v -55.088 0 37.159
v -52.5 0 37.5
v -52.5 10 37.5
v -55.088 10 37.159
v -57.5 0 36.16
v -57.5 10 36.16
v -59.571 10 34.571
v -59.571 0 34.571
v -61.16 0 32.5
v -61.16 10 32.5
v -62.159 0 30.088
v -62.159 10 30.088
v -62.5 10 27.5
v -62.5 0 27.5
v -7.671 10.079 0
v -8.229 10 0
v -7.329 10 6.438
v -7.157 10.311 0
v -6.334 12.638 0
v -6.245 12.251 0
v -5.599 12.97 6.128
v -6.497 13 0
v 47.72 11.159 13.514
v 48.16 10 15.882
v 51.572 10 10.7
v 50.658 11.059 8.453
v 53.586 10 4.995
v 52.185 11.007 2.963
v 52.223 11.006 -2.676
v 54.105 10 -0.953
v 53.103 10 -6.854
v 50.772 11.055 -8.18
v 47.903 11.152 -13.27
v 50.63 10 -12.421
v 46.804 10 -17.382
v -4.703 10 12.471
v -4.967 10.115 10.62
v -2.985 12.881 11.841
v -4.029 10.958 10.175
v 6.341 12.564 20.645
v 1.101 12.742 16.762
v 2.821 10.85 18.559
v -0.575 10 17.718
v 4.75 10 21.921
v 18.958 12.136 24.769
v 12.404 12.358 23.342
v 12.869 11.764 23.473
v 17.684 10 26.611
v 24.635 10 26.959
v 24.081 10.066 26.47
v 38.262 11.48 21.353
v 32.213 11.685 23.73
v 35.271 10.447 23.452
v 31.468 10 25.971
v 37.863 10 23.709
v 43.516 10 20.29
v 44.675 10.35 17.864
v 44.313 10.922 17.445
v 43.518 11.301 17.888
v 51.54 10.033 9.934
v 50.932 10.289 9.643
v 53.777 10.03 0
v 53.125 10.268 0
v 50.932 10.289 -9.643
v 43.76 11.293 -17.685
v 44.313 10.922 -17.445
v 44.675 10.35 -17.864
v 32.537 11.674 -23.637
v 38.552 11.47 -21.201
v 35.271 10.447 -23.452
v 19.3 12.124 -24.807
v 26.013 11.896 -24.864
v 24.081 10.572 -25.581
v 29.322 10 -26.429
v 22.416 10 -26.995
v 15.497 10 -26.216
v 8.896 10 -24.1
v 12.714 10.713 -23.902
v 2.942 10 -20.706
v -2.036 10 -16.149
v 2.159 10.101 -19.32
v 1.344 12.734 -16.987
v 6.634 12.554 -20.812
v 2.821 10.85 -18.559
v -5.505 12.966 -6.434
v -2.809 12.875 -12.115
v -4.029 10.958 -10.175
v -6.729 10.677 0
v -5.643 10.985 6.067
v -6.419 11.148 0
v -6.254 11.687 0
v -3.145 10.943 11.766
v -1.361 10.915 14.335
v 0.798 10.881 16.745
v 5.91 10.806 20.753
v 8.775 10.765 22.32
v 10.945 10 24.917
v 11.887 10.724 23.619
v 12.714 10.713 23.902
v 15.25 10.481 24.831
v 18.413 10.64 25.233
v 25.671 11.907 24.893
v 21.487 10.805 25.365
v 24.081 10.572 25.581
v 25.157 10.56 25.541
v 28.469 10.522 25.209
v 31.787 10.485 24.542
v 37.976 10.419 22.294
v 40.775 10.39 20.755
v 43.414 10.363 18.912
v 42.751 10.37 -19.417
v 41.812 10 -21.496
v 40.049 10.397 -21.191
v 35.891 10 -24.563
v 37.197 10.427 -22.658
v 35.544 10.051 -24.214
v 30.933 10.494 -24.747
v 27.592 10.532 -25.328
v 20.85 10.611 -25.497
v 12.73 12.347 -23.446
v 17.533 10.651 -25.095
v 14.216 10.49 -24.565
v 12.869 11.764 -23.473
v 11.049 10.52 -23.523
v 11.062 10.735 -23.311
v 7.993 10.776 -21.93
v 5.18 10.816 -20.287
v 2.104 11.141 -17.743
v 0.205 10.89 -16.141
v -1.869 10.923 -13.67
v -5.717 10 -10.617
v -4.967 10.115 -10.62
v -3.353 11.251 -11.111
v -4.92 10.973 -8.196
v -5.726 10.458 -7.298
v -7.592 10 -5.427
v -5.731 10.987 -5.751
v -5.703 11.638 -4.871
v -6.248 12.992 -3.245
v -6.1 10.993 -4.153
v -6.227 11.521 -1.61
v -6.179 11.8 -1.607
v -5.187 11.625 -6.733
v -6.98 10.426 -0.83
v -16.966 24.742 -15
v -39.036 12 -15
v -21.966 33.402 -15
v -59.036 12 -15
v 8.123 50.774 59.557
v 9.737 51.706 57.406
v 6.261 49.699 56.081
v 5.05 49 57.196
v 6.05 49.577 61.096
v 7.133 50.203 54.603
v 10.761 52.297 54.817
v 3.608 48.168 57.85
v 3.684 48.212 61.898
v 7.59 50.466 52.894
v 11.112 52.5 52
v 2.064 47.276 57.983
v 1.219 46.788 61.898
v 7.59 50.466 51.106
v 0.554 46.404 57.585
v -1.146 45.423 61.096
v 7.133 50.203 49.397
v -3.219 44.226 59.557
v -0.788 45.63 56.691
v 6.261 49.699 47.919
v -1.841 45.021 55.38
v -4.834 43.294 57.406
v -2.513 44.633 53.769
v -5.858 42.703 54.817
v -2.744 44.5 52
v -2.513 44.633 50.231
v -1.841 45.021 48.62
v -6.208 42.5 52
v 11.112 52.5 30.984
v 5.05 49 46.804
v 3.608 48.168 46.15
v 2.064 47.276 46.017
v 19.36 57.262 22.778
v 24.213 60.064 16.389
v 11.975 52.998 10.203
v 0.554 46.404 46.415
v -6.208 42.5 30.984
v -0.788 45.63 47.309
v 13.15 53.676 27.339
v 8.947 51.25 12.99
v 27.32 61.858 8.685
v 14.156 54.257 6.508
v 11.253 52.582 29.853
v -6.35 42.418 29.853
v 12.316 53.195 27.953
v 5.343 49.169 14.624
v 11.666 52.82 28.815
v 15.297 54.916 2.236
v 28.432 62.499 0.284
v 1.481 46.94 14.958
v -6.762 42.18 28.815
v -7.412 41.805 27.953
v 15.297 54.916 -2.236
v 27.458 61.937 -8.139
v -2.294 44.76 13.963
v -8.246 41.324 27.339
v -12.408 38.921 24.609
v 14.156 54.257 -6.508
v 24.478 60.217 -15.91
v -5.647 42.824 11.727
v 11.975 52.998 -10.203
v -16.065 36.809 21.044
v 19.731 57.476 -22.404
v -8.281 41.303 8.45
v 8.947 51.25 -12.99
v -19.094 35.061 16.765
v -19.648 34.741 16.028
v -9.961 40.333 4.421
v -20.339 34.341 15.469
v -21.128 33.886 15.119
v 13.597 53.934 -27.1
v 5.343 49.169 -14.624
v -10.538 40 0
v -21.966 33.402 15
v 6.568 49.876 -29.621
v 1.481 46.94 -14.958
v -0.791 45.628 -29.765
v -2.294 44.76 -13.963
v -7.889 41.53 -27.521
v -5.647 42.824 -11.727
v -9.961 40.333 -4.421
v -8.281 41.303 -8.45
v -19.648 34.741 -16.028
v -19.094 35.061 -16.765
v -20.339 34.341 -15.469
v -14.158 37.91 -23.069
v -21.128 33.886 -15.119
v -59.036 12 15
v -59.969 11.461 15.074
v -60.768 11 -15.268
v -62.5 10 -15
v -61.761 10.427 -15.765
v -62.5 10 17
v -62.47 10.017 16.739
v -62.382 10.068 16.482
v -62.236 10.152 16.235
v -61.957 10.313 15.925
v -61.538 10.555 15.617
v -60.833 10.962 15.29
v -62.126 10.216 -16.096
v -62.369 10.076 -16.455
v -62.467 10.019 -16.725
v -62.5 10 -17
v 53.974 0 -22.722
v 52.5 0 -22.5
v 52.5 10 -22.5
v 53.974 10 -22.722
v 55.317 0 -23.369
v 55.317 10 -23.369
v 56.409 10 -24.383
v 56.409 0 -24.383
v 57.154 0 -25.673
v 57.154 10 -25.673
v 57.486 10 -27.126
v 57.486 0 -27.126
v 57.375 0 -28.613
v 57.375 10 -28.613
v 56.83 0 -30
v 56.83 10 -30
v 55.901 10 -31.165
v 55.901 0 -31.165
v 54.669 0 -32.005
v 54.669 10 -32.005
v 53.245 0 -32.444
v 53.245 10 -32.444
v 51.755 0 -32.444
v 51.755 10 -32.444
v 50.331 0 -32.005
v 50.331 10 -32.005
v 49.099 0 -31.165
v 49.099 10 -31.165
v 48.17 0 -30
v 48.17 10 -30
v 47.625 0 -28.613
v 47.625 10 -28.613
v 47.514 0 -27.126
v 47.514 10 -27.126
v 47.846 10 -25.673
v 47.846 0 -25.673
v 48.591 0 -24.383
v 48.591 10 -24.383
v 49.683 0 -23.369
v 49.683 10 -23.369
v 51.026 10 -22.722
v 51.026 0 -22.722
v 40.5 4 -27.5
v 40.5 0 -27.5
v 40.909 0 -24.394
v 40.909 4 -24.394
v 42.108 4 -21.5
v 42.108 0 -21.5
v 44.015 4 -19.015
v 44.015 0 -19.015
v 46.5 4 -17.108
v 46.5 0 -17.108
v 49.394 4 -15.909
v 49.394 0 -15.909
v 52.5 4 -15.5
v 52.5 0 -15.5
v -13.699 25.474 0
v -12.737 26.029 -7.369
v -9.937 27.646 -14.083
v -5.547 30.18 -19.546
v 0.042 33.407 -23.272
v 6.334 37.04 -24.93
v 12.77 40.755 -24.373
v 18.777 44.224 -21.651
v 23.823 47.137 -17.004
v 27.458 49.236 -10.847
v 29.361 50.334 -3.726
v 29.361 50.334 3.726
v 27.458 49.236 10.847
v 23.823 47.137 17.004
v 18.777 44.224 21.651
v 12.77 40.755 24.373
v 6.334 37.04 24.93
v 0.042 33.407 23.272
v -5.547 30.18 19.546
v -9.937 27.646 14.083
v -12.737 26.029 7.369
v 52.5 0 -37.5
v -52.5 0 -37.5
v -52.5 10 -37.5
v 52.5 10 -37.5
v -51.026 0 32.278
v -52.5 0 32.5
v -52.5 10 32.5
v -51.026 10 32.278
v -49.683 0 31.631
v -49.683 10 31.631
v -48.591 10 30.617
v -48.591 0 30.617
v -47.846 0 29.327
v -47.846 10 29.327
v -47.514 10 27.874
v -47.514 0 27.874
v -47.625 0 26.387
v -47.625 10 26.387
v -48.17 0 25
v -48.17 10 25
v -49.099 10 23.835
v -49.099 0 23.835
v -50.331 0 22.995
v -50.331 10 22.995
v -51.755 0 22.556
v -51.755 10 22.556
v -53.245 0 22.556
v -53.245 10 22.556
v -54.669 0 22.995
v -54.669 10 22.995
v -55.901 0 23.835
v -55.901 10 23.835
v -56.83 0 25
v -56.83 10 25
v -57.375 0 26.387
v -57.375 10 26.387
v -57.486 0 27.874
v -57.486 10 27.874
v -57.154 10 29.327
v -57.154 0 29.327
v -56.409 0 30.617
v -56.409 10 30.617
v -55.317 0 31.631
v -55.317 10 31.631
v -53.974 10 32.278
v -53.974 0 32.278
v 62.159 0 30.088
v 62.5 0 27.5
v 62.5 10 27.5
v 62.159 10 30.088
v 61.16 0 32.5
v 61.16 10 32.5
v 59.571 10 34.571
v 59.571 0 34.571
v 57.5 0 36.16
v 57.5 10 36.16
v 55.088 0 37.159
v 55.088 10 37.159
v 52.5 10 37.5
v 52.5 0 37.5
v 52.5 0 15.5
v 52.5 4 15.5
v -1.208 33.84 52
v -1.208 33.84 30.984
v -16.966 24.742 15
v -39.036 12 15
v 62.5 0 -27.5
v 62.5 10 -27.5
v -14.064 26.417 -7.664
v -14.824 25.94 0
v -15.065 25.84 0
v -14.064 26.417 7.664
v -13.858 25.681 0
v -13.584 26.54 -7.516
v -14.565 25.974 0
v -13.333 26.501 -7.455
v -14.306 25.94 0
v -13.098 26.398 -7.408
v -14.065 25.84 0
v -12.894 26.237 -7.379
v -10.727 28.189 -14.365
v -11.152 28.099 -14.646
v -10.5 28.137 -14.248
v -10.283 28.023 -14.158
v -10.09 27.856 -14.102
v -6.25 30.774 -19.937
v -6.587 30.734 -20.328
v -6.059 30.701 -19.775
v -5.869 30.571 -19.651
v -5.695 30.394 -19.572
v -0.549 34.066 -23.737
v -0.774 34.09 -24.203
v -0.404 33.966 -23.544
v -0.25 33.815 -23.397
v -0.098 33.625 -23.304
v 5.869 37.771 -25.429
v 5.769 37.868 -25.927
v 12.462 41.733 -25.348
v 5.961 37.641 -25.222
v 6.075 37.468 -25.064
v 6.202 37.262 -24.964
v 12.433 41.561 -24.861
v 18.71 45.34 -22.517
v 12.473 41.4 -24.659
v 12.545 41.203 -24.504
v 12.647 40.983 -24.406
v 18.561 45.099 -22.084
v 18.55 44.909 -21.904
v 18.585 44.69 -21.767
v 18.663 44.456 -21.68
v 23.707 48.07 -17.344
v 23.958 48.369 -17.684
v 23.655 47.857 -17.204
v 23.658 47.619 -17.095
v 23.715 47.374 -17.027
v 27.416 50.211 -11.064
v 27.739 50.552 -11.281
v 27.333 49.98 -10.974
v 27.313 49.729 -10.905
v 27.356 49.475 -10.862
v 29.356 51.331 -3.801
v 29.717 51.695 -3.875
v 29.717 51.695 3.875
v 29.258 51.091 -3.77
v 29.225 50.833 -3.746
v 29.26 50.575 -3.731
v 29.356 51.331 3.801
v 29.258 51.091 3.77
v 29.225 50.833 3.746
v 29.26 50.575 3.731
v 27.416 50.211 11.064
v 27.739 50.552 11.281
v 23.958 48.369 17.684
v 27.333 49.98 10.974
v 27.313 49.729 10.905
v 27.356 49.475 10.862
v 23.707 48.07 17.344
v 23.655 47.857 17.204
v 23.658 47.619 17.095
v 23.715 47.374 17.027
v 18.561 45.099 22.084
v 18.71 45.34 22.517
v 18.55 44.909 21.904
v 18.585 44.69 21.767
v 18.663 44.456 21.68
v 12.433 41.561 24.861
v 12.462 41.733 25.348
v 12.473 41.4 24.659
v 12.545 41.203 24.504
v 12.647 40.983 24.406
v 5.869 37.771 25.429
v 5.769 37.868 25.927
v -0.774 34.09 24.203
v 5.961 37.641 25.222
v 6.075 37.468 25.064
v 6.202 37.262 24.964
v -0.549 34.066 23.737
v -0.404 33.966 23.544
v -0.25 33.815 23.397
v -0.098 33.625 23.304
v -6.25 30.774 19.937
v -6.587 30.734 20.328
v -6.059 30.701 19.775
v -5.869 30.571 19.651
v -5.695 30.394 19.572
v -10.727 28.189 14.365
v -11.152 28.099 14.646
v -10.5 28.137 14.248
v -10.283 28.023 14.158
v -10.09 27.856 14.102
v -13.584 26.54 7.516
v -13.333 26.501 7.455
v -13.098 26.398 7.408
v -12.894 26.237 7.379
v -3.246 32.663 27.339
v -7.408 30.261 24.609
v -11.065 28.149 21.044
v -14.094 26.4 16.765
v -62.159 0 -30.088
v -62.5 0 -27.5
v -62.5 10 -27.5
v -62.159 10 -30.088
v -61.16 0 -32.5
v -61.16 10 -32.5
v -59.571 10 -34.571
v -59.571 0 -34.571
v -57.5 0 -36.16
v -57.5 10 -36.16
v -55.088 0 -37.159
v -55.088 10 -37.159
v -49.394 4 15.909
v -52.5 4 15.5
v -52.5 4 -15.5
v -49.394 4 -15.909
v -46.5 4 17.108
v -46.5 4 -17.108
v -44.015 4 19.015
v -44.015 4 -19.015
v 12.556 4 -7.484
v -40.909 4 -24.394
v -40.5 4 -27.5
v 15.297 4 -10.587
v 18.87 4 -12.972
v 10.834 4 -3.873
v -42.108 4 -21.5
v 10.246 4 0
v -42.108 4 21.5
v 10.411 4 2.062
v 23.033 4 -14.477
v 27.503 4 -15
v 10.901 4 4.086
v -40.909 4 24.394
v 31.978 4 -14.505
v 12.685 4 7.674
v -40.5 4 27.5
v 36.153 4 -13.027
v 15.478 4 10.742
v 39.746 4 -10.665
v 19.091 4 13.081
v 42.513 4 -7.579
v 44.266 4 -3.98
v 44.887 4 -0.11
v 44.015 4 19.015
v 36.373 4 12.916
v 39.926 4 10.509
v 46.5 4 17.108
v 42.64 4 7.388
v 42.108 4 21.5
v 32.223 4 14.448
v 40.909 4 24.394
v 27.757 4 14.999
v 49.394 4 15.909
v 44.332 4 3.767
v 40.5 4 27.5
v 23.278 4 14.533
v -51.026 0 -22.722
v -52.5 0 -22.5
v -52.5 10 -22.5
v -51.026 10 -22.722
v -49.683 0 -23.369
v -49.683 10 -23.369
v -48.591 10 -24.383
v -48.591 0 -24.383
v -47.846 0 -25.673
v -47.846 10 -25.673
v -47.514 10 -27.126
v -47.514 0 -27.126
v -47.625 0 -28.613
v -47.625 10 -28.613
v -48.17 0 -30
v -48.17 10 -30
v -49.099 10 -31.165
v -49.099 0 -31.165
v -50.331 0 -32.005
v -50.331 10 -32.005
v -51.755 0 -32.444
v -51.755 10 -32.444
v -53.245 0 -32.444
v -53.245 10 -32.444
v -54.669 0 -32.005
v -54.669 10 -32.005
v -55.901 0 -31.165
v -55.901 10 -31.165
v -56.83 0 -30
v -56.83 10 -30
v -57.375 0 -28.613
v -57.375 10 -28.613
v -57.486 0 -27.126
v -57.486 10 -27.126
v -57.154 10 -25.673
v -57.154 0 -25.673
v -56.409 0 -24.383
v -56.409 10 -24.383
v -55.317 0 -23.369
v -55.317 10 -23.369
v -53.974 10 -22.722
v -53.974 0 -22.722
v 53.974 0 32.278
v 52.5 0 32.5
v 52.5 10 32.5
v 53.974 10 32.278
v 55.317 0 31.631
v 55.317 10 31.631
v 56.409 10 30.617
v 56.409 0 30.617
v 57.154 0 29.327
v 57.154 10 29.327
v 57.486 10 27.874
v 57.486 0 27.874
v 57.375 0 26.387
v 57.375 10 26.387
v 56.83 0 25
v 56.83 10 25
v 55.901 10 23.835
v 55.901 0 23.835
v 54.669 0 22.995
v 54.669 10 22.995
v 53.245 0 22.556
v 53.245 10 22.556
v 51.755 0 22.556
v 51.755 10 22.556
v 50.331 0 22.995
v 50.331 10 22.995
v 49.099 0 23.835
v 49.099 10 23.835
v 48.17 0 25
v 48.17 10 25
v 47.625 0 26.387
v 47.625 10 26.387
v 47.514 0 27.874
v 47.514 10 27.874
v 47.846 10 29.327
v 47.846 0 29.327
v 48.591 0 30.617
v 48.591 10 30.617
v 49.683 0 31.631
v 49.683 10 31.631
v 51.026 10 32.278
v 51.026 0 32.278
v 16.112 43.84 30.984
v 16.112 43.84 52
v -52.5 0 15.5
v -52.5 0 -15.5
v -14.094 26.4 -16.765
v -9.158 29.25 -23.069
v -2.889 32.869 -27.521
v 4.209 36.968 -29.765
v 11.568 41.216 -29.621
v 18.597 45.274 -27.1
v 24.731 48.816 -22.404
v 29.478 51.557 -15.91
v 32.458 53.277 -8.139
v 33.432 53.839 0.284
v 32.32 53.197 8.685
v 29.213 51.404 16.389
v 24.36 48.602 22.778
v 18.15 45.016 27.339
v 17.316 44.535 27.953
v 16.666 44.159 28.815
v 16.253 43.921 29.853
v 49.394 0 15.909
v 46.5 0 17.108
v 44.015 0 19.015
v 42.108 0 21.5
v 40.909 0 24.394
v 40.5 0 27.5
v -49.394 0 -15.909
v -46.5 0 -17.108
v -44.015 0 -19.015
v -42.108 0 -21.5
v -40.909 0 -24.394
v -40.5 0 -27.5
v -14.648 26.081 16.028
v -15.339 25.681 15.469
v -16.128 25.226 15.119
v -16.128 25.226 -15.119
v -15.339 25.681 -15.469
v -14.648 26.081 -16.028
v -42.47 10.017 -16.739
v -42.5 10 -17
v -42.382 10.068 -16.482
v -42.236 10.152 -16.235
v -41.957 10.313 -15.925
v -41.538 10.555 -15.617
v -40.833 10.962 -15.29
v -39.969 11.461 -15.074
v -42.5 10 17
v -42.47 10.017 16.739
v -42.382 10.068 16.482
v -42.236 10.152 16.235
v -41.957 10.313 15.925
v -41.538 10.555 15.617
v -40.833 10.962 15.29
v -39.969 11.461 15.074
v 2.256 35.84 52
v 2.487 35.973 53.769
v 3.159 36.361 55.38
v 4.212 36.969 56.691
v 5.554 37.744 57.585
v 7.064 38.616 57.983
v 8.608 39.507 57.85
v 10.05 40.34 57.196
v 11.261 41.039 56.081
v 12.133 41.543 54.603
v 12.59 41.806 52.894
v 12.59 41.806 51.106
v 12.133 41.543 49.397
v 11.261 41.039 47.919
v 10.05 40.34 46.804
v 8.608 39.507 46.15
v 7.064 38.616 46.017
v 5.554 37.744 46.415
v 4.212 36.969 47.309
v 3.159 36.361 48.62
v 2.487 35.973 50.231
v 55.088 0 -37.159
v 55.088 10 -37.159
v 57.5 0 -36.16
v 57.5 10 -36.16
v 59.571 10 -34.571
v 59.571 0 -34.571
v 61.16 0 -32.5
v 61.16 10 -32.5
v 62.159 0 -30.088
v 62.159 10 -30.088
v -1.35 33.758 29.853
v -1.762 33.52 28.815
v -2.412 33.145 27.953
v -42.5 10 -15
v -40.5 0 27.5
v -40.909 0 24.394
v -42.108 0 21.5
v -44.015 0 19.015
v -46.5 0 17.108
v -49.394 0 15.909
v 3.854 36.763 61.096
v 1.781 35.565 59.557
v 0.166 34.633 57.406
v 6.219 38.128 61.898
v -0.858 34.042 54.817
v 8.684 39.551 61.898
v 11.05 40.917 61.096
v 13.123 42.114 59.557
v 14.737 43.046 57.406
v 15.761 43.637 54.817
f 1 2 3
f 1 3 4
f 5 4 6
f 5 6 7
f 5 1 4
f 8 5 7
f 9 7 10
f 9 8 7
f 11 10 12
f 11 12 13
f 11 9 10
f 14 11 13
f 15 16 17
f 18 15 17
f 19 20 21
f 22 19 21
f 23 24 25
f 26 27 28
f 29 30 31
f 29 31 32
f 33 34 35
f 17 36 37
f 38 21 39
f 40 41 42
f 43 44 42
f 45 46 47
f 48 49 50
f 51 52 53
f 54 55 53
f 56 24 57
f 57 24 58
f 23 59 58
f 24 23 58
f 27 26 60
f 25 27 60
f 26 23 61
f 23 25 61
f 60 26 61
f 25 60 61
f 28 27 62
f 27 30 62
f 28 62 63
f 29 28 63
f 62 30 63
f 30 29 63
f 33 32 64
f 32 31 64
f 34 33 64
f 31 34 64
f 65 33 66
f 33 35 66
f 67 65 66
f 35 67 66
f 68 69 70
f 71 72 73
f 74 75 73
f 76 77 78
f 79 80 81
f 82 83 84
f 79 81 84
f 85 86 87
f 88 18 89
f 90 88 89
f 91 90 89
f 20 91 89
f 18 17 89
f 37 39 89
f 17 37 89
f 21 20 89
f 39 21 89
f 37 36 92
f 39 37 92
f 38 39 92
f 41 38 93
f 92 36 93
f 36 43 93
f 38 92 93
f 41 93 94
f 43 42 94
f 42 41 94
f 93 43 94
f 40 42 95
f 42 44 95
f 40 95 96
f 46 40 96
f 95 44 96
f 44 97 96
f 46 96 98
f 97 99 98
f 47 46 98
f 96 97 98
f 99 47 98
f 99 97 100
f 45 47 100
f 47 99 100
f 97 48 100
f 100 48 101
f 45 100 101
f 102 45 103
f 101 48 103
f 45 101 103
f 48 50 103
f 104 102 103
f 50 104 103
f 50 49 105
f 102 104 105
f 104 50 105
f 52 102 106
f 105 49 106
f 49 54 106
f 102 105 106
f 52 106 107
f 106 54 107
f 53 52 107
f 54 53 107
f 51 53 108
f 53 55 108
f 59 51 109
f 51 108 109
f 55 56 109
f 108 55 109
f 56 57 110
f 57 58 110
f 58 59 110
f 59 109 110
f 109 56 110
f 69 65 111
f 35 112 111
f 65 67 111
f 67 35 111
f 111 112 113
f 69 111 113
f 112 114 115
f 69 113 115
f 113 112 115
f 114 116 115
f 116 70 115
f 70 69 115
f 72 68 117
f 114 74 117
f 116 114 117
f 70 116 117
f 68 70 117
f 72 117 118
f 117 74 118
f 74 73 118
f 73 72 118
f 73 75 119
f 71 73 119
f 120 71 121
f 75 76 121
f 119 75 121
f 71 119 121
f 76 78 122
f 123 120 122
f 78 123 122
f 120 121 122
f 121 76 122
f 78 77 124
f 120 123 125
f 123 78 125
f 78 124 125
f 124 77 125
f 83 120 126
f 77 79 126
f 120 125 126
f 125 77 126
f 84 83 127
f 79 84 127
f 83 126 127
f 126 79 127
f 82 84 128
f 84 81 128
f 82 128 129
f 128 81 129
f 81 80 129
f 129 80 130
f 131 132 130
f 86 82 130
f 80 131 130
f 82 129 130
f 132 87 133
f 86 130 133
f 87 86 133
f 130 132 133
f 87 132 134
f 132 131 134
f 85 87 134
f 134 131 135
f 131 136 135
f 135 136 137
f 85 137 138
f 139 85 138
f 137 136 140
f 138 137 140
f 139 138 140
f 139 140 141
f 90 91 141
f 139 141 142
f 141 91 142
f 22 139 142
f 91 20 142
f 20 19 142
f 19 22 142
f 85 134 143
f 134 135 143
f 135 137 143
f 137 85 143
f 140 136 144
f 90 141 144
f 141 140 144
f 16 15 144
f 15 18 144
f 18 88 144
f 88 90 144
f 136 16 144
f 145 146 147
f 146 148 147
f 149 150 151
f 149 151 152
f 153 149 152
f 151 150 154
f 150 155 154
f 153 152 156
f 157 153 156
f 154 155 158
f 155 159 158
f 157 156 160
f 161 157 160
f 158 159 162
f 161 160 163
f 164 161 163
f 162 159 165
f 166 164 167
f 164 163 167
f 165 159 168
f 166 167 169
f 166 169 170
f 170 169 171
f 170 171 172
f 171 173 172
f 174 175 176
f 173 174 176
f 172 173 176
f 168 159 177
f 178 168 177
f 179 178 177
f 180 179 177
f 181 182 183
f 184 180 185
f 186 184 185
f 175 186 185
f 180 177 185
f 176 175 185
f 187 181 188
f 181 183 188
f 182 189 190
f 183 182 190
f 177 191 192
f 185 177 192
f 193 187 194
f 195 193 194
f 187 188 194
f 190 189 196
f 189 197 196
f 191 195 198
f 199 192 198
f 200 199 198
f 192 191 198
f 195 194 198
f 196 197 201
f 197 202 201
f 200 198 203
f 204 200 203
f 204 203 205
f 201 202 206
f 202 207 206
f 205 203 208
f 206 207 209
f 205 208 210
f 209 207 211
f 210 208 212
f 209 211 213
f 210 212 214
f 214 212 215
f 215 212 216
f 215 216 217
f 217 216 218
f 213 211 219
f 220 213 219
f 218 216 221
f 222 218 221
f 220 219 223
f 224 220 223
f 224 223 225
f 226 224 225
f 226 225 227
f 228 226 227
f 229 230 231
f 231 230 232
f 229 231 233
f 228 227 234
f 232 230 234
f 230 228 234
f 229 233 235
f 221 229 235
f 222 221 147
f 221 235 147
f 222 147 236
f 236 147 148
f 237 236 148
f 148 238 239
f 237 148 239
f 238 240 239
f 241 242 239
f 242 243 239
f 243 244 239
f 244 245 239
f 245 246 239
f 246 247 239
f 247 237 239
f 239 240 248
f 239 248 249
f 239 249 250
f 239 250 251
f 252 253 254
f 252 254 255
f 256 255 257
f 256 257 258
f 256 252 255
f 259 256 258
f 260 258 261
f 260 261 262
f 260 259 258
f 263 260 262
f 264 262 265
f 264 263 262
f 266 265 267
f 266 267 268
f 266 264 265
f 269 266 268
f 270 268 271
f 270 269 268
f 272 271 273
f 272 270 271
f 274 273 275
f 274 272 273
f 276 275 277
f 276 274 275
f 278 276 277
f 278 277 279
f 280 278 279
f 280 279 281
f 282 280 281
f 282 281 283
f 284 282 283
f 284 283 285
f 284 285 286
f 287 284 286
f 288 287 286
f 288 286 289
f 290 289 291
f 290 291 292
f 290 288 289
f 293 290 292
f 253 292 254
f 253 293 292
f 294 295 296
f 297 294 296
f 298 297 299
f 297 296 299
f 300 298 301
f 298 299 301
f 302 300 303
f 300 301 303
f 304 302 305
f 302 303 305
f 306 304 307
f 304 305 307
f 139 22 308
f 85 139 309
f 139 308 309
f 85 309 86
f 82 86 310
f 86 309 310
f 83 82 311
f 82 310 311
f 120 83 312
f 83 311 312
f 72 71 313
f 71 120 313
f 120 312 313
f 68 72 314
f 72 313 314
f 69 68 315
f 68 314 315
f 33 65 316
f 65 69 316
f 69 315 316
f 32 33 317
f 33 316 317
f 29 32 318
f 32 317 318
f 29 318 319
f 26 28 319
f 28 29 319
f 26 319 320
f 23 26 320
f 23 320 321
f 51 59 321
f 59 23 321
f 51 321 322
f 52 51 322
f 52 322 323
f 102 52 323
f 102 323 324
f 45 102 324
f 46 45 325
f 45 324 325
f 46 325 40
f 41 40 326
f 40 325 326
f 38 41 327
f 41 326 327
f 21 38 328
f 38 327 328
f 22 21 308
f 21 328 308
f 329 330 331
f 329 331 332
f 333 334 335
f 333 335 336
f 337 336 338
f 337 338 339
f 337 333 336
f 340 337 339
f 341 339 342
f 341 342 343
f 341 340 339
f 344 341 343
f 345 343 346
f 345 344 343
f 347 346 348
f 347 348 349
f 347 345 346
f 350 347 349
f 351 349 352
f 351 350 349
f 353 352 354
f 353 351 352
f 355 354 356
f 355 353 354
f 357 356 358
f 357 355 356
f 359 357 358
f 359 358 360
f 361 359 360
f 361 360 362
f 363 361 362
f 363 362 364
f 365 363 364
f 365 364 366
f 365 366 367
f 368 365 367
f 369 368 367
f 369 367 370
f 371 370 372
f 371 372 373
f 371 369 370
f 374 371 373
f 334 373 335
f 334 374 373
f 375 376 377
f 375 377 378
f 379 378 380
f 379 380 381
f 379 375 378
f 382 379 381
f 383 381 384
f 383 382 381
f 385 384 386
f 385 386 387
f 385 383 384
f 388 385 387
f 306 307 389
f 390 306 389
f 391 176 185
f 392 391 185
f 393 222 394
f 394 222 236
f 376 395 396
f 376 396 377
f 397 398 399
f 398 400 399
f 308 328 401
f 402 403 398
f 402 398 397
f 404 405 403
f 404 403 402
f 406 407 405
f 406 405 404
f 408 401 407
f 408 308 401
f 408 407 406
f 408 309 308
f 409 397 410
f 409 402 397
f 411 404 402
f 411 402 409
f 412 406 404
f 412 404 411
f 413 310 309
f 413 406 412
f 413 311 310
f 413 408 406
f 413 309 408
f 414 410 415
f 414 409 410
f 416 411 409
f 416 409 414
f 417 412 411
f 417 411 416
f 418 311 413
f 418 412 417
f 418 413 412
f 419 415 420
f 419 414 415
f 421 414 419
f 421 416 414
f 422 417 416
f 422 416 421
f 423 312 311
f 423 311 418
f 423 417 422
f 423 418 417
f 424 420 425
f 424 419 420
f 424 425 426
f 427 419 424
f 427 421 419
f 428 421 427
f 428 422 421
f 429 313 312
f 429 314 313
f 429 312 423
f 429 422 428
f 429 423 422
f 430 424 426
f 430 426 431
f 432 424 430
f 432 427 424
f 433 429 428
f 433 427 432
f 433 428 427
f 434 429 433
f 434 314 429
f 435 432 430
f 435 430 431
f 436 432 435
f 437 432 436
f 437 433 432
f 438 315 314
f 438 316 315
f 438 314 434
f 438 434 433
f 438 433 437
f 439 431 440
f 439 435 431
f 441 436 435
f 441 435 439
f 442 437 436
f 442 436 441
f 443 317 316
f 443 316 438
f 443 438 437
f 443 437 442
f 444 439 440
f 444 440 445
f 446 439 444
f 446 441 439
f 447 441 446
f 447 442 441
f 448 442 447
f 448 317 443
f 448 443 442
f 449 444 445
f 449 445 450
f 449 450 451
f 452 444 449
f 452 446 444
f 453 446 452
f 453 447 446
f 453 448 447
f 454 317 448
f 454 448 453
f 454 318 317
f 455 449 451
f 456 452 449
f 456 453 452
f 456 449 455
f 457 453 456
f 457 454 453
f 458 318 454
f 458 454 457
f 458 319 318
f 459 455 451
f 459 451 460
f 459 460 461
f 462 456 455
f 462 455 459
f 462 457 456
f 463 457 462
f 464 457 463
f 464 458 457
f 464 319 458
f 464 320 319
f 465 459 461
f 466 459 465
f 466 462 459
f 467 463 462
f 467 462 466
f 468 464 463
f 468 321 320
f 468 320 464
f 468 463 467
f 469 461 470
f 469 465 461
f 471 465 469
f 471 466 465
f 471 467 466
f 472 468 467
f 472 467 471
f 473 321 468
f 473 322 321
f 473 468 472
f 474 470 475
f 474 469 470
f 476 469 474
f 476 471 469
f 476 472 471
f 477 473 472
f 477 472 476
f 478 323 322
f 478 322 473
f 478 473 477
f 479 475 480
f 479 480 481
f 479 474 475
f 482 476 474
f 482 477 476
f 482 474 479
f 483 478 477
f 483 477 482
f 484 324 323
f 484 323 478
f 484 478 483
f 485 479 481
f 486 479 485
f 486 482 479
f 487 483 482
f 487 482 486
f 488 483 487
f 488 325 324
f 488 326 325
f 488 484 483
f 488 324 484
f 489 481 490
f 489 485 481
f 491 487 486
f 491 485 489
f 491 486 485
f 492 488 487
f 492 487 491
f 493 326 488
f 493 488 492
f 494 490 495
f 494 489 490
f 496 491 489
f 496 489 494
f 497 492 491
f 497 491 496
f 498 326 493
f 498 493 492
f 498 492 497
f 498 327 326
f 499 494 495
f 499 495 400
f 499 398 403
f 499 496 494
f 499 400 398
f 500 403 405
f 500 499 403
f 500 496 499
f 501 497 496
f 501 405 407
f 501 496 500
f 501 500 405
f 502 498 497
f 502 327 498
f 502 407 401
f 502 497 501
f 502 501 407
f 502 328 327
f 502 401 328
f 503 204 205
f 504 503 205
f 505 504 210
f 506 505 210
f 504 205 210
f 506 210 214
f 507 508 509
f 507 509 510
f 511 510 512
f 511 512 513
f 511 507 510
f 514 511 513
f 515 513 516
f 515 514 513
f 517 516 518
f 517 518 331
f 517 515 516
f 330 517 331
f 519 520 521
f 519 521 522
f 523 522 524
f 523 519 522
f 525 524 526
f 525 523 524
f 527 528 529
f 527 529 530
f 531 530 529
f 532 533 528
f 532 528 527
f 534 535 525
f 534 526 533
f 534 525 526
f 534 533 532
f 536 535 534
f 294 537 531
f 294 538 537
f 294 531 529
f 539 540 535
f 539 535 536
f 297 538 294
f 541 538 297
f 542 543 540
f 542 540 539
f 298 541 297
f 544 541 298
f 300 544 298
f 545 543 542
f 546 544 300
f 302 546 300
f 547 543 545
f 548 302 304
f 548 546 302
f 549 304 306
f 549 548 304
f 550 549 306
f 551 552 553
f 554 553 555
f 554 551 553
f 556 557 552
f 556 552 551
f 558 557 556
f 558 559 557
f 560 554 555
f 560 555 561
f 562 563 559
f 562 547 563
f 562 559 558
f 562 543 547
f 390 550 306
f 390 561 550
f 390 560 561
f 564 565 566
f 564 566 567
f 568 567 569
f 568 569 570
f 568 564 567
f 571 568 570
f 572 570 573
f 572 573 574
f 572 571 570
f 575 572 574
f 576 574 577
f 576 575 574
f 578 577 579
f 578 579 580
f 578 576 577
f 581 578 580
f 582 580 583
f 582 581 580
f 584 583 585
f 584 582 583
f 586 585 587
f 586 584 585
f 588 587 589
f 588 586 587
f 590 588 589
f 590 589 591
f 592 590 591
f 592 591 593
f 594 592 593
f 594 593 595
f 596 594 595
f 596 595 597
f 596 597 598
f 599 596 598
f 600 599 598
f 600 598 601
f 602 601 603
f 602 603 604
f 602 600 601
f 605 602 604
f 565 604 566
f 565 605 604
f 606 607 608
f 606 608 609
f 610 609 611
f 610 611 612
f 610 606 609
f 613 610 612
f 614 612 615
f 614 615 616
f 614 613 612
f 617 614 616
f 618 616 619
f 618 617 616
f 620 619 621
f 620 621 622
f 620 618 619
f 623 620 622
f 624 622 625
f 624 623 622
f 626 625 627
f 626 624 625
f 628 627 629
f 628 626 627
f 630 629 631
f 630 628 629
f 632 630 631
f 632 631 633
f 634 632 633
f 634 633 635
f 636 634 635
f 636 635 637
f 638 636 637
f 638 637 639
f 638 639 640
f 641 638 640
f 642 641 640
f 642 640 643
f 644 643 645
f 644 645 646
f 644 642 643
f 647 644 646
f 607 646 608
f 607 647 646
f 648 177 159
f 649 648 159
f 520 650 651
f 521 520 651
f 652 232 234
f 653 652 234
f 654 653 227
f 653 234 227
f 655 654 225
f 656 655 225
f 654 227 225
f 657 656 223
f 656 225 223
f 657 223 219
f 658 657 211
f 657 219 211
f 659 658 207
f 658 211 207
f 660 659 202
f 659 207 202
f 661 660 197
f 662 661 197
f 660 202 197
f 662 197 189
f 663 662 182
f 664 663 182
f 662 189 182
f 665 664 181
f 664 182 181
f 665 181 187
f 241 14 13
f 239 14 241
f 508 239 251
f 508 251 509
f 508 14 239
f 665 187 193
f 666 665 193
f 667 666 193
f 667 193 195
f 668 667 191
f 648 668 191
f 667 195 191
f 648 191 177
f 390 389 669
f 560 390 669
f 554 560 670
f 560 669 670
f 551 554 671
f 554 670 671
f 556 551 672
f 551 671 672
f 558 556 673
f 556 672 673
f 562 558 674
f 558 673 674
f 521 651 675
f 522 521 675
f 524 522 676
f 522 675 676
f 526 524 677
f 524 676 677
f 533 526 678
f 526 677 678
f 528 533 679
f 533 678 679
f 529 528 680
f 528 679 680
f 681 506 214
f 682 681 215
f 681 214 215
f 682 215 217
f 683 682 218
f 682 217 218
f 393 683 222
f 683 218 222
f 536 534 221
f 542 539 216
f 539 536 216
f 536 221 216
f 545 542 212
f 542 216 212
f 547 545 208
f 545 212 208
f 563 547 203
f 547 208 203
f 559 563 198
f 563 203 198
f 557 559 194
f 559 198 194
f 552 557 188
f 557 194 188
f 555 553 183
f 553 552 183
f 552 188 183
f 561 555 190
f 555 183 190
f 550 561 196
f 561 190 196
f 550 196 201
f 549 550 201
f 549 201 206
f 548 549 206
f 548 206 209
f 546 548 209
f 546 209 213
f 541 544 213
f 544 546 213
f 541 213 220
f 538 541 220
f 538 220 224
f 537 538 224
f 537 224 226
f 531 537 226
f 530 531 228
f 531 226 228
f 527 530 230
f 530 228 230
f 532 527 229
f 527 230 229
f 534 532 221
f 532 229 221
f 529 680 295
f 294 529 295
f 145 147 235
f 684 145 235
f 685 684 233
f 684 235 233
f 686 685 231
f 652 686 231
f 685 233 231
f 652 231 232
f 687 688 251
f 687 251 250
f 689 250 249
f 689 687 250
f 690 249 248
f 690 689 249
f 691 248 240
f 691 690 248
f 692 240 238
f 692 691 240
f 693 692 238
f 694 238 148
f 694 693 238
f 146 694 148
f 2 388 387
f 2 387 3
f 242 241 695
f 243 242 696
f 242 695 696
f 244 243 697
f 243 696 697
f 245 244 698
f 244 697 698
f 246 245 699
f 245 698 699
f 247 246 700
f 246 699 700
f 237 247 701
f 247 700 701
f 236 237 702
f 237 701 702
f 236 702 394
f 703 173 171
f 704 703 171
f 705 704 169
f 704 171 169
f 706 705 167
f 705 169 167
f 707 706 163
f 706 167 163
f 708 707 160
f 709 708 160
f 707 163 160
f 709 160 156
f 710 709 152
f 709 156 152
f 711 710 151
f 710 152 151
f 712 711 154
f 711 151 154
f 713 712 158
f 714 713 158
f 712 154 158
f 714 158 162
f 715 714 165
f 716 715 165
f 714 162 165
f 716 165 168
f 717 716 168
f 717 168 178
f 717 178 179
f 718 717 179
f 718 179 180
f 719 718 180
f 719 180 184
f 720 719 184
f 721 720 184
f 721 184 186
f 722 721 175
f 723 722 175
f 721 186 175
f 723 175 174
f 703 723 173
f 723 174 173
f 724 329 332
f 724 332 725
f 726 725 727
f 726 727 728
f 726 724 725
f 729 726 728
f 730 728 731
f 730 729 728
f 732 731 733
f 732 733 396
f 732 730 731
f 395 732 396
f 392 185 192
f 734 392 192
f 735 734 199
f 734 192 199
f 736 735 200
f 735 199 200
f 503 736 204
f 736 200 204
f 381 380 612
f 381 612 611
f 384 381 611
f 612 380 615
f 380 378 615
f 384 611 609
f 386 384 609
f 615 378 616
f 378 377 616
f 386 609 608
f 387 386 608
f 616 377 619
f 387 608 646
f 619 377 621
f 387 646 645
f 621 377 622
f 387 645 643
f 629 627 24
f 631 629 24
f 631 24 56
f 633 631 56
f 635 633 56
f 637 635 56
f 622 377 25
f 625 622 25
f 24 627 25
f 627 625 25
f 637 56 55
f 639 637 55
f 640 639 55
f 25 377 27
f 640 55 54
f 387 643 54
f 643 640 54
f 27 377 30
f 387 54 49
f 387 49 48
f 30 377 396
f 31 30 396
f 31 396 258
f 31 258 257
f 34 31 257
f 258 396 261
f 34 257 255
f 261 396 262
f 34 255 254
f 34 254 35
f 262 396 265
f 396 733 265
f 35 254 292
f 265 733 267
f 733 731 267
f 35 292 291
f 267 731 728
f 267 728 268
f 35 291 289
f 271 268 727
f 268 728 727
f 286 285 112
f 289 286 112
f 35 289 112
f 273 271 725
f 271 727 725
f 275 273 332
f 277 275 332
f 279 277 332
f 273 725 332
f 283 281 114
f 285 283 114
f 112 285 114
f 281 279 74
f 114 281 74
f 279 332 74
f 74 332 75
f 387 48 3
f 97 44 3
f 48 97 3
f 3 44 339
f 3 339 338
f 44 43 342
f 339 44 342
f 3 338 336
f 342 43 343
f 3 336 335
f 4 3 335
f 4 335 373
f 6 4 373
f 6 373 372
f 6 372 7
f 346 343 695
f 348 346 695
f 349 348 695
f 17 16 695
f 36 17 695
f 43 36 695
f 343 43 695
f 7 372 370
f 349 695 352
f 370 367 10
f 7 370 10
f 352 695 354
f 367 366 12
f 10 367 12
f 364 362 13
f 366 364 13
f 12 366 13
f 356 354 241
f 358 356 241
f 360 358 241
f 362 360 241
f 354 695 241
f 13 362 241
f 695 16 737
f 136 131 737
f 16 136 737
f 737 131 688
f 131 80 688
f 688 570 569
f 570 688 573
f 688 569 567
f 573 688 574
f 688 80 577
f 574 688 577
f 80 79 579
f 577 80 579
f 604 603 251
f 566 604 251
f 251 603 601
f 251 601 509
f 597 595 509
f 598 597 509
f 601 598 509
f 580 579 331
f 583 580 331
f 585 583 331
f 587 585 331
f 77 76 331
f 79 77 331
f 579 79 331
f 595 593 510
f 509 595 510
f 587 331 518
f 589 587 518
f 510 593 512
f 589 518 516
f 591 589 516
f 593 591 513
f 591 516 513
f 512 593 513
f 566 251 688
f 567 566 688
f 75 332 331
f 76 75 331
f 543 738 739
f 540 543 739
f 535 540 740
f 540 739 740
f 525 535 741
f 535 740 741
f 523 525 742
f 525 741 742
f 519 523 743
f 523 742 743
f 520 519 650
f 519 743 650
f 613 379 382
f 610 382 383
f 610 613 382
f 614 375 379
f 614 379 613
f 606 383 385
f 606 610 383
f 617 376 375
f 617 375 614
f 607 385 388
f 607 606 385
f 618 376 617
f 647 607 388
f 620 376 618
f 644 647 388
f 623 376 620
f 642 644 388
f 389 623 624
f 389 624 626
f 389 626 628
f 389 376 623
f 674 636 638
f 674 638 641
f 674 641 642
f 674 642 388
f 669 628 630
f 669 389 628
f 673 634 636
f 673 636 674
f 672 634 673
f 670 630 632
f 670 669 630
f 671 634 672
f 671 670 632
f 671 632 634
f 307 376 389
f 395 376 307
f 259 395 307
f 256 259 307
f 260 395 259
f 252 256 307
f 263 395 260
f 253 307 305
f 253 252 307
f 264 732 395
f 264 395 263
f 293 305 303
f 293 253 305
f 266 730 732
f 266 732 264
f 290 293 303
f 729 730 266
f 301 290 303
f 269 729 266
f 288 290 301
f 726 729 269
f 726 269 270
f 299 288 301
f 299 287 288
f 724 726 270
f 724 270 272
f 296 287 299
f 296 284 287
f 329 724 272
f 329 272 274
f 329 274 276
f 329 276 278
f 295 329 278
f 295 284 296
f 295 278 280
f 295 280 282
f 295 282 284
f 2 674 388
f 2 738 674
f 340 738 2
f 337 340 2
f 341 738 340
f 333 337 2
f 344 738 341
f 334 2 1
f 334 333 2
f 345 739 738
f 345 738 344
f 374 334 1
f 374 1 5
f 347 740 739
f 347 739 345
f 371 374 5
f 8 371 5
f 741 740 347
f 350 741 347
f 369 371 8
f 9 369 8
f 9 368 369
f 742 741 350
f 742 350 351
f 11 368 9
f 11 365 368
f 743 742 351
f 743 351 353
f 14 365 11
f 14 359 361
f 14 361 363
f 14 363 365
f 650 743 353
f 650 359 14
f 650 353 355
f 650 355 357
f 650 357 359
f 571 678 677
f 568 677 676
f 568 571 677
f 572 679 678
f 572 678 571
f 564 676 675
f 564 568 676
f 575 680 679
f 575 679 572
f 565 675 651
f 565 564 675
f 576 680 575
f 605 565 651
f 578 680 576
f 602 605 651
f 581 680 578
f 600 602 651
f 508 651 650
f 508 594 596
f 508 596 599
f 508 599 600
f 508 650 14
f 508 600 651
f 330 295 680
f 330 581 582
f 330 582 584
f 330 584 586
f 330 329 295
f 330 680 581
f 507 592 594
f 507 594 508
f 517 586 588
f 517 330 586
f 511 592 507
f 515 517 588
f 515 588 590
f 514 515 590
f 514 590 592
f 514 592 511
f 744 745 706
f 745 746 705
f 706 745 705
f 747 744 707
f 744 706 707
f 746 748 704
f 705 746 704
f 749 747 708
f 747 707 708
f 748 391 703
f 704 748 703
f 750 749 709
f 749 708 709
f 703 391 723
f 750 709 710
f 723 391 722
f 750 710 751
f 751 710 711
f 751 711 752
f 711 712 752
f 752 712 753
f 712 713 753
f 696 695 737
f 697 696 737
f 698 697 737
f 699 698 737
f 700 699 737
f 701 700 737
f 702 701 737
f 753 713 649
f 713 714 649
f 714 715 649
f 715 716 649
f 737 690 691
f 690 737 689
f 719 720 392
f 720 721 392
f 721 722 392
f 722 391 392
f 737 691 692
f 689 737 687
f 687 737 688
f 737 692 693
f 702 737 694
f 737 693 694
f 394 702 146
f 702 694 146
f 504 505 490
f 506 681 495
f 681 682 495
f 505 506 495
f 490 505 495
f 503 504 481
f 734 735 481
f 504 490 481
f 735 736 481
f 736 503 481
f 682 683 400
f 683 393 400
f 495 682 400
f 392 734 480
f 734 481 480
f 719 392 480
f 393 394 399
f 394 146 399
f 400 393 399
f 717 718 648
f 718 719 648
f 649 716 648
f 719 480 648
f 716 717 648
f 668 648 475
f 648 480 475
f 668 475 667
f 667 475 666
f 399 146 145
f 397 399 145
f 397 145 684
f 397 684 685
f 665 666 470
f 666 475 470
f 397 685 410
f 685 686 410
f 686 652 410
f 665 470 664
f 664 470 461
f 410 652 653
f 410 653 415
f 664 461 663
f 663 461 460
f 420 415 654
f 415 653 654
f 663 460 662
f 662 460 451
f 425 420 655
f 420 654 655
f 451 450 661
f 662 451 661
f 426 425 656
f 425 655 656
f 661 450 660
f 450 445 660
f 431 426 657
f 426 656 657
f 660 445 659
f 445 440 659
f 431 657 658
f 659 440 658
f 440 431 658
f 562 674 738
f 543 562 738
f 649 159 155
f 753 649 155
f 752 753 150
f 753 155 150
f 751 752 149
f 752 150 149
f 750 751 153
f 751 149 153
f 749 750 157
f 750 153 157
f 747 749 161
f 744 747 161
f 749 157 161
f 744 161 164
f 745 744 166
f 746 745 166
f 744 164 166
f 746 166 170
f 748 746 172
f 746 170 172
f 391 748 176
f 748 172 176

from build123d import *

# Parameters (mm, degrees)
SKETCH_1_R          = 5
EXTRUDE_1_DEPTH     = 10
CUT_EXTRUDE_1_DEPTH = 4
SKETCH_4_R          = 15
SKETCH_4_R_2        = 6
EXTRUDE_2_DEPTH     = 10
EXTRUDE_7_REACH     = 107.748
SKETCH_6_R          = 25
SKETCH_13_R         = 15
CUT_EXTRUDE_2_DEPTH = 109.800134443
FILLET_7_R          = 2
FILLET_8_R          = 2
FILLET_9_R          = 2
FILLET_10_R         = 1


with BuildPart() as part:
    # 草图1 → 凸台-拉伸1 (new body)
    with BuildSketch(Plane(origin=(0, 0, 0), x_dir=(1, 0, 0), z_dir=(0, 1, 0))):
        with BuildLine():
            Line((-52.5, 37.5), (52.5, 37.5))
            ThreePointArc((52.5, 37.5), (59.571067812, 34.571067812), (62.5, 27.5))
            Line((62.5, 27.5), (62.5, -27.5))
            ThreePointArc((62.5, -27.5), (59.571067812, -34.571067812), (52.5, -37.5))
            Line((52.5, -37.5), (-52.5, -37.5))
            ThreePointArc((-52.5, -37.5), (-59.571067812, -34.571067812), (-62.5, -27.5))
            Line((-62.5, -27.5), (-62.5, 27.5))
            ThreePointArc((-62.5, 27.5), (-59.571067812, 34.571067812), (-52.5, 37.5))
        make_face()
        with Locations(Location((-52.5, -27.5, 0), (0, 0, 270))):
            Circle(SKETCH_1_R, mode=Mode.SUBTRACT)
        with Locations(Location((52.5, -27.5, 0), (0, 0, 270))):
            Circle(SKETCH_1_R, mode=Mode.SUBTRACT)
        with Locations(Location((52.5, 27.5, 0), (0, 0, 270))):
            Circle(SKETCH_1_R, mode=Mode.SUBTRACT)
        with Locations(Location((-52.5, 27.5, 0), (0, 0, 270))):
            Circle(SKETCH_1_R, mode=Mode.SUBTRACT)
    extrude(amount=EXTRUDE_1_DEPTH)

    # 草图5 → 切除-拉伸1 (cut)
    with BuildSketch(Plane.XZ):
        with BuildLine():
            Line((40.5, 27.5), (-40.5, 27.5))
            ThreePointArc((-40.5, 27.5), (-44.014718626, 19.014718626), (-52.5, 15.5))
            Line((-52.5, 15.5), (-52.5, -15.5))
            ThreePointArc((-52.5, -15.5), (-44.014718626, -19.014718626), (-40.5, -27.5))
            Line((-40.5, -27.5), (40.5, -27.5))
            ThreePointArc((40.5, -27.5), (44.014718626, -19.014718626), (52.5, -15.5))
            Line((52.5, -15.5), (52.5, 15.5))
            ThreePointArc((52.5, 15.5), (44.014718626, 19.014718626), (40.5, 27.5))
        make_face()
    extrude(amount=-CUT_EXTRUDE_1_DEPTH, mode=Mode.SUBTRACT)

    # 草图4 → 凸台-拉伸2 (add)
    with BuildSketch(Plane(origin=(-19.955127019, 34.563293868, 0), x_dir=(0, 0, 1), z_dir=(-0.500000000000001, 0.866025403784438, 0))):
        with BuildLine():
            Line((30.98386677, 35.873412263), (52, 35.873412263))
            ThreePointArc((52, 35.873412263), (62, 25.873412263), (52, 15.873412263))
            Line((52, 15.873412263), (30.98386677, 15.873412263))
            ThreePointArc((30.98386677, 15.873412263), (28.814562191, 15.234084465), (27.338705973, 13.520471087))
            ThreePointArc((27.338705973, 13.520471087), (22.923803215, 6.52142926), (16.764705882, 0.994814299))
            ThreePointArc((16.764705882, 0.994814299), (15.468627995, -0.443659223), (15, -2.322332096))
            Line((15, -2.322332096), (15, -49.126587737))
            Line((15, -49.126587737), (-15, -49.126587737))
            Line((-15, -49.126587737), (-15, -2.322332096))
            ThreePointArc((-15, -2.322332096), (-15.468627995, -0.443659223), (-16.764705882, 0.994814299))
            ThreePointArc((-16.764705882, 0.994814299), (-19.351983004, 48.797215478), (27.338705973, 38.22635344))
            ThreePointArc((27.338705973, 38.22635344), (28.814562191, 36.512740062), (30.98386677, 35.873412263))
        make_face()
        with Locations(Location((0, 25.873412263, 0), (0, 0, 270))):
            Circle(SKETCH_4_R, mode=Mode.SUBTRACT)
        with Locations(Location((52, 25.873412263, 0), (0, 0, 270))):
            Circle(SKETCH_4_R_2, mode=Mode.SUBTRACT)
    extrude(amount=-EXTRUDE_2_DEPTH)

    # 凸台-拉伸7: up to this plane
    extrude_7_end = Plane(origin=(-52.5, 10, 27.5), z_dir=(0, 1, 0))
    # 草图6 → 凸台-拉伸7 (add, up to the surface)
    with BuildSketch(Plane(origin=(-14.955127019, 25.90303983, 0), x_dir=(0.8660254037844382, 0.500000000000001, 0), z_dir=(0.500000000000001, -0.8660254037844382, 0)), mode=Mode.PRIVATE) as extrude_7_sk1:
        with Locations(Location((25.873412263, 0, 0), (0, 0, 180))):
            Circle(SKETCH_6_R)
    extrude_7_tool1 = split(extrude(extrude_7_sk1.sketch, amount=EXTRUDE_7_REACH, mode=Mode.PRIVATE), bisect_by=extrude_7_end, keep=Keep.BOTH, mode=Mode.PRIVATE)
    add(extrude_7_tool1.solids().sort_by_distance((7.451905, 38.839746, 0))[0])

    # 草图13 → 切除-拉伸2 (cut, through all)
    with BuildSketch(Plane(origin=(-19.955127019, 34.563293868, 0), x_dir=(0, 0, 1), z_dir=(-0.500000000000001, 0.866025403784438, 0))):
        with Locations(Location((0, 25.873412263, 0), (0, 0, 270))):
            Circle(SKETCH_13_R)
    extrude(amount=-CUT_EXTRUDE_2_DEPTH, mode=Mode.SUBTRACT)

    # 圆角7
    fillet_7_edges = [part.edges().sort_by_distance(p)[0] for p in [
        (-52.5, 10, 15),
    ]]
    fillet(fillet_7_edges, radius=FILLET_7_R)

    # 圆角8
    # the kernel refuses this fillet: 2 mm, written as the material it adds along each edge
    with BuildSketch(Plane(origin=(-37.5, 10, -15), x_dir=(0, 0, -1), z_dir=(-1, 0, 0))) as fillet_8_piece_1_section:
        with BuildLine():
            CenterArc((FILLET_8_R, -FILLET_8_R), FILLET_8_R, 90, 90)
            Line((0, -FILLET_8_R), (0, 0))
            Line((0, 0), (FILLET_8_R, 0))
        make_face()
    fillet_8_piece_1 = extrude(amount=25, mode=Mode.PRIVATE)
    fillet_8_piece_1 = split(fillet_8_piece_1, bisect_by=Plane(origin=(-49.214592268, 6.123328347, -15.452717167), z_dir=(-0.500000000000001, 0.866025403784438, 0)), keep=Keep.TOP, mode=Mode.PRIVATE)
    fillet_8_piece_1 = split(fillet_8_piece_1, bisect_by=Plane(origin=(-54.214592268, 14.783582385, -15.452717167), z_dir=(0.500000000000001, -0.866025403784438, 0)), keep=Keep.TOP, mode=Mode.PRIVATE)
    add(fillet_8_piece_1)

    # 圆角9
    fillet_9_edges = [part.edges().sort_by_distance(p)[0] for p in [
        (52.970053814, 10, -0.001007854),
    ]]
    fillet(fillet_9_edges, radius=FILLET_9_R)

    # 圆角10
    fillet_10_edges = [part.edges().sort_by_distance(p)[0] for p in [
        (29.102540378, 51.339745962, 0),
    ]]
    fillet(fillet_10_edges, radius=FILLET_10_R)


solid = part.part
